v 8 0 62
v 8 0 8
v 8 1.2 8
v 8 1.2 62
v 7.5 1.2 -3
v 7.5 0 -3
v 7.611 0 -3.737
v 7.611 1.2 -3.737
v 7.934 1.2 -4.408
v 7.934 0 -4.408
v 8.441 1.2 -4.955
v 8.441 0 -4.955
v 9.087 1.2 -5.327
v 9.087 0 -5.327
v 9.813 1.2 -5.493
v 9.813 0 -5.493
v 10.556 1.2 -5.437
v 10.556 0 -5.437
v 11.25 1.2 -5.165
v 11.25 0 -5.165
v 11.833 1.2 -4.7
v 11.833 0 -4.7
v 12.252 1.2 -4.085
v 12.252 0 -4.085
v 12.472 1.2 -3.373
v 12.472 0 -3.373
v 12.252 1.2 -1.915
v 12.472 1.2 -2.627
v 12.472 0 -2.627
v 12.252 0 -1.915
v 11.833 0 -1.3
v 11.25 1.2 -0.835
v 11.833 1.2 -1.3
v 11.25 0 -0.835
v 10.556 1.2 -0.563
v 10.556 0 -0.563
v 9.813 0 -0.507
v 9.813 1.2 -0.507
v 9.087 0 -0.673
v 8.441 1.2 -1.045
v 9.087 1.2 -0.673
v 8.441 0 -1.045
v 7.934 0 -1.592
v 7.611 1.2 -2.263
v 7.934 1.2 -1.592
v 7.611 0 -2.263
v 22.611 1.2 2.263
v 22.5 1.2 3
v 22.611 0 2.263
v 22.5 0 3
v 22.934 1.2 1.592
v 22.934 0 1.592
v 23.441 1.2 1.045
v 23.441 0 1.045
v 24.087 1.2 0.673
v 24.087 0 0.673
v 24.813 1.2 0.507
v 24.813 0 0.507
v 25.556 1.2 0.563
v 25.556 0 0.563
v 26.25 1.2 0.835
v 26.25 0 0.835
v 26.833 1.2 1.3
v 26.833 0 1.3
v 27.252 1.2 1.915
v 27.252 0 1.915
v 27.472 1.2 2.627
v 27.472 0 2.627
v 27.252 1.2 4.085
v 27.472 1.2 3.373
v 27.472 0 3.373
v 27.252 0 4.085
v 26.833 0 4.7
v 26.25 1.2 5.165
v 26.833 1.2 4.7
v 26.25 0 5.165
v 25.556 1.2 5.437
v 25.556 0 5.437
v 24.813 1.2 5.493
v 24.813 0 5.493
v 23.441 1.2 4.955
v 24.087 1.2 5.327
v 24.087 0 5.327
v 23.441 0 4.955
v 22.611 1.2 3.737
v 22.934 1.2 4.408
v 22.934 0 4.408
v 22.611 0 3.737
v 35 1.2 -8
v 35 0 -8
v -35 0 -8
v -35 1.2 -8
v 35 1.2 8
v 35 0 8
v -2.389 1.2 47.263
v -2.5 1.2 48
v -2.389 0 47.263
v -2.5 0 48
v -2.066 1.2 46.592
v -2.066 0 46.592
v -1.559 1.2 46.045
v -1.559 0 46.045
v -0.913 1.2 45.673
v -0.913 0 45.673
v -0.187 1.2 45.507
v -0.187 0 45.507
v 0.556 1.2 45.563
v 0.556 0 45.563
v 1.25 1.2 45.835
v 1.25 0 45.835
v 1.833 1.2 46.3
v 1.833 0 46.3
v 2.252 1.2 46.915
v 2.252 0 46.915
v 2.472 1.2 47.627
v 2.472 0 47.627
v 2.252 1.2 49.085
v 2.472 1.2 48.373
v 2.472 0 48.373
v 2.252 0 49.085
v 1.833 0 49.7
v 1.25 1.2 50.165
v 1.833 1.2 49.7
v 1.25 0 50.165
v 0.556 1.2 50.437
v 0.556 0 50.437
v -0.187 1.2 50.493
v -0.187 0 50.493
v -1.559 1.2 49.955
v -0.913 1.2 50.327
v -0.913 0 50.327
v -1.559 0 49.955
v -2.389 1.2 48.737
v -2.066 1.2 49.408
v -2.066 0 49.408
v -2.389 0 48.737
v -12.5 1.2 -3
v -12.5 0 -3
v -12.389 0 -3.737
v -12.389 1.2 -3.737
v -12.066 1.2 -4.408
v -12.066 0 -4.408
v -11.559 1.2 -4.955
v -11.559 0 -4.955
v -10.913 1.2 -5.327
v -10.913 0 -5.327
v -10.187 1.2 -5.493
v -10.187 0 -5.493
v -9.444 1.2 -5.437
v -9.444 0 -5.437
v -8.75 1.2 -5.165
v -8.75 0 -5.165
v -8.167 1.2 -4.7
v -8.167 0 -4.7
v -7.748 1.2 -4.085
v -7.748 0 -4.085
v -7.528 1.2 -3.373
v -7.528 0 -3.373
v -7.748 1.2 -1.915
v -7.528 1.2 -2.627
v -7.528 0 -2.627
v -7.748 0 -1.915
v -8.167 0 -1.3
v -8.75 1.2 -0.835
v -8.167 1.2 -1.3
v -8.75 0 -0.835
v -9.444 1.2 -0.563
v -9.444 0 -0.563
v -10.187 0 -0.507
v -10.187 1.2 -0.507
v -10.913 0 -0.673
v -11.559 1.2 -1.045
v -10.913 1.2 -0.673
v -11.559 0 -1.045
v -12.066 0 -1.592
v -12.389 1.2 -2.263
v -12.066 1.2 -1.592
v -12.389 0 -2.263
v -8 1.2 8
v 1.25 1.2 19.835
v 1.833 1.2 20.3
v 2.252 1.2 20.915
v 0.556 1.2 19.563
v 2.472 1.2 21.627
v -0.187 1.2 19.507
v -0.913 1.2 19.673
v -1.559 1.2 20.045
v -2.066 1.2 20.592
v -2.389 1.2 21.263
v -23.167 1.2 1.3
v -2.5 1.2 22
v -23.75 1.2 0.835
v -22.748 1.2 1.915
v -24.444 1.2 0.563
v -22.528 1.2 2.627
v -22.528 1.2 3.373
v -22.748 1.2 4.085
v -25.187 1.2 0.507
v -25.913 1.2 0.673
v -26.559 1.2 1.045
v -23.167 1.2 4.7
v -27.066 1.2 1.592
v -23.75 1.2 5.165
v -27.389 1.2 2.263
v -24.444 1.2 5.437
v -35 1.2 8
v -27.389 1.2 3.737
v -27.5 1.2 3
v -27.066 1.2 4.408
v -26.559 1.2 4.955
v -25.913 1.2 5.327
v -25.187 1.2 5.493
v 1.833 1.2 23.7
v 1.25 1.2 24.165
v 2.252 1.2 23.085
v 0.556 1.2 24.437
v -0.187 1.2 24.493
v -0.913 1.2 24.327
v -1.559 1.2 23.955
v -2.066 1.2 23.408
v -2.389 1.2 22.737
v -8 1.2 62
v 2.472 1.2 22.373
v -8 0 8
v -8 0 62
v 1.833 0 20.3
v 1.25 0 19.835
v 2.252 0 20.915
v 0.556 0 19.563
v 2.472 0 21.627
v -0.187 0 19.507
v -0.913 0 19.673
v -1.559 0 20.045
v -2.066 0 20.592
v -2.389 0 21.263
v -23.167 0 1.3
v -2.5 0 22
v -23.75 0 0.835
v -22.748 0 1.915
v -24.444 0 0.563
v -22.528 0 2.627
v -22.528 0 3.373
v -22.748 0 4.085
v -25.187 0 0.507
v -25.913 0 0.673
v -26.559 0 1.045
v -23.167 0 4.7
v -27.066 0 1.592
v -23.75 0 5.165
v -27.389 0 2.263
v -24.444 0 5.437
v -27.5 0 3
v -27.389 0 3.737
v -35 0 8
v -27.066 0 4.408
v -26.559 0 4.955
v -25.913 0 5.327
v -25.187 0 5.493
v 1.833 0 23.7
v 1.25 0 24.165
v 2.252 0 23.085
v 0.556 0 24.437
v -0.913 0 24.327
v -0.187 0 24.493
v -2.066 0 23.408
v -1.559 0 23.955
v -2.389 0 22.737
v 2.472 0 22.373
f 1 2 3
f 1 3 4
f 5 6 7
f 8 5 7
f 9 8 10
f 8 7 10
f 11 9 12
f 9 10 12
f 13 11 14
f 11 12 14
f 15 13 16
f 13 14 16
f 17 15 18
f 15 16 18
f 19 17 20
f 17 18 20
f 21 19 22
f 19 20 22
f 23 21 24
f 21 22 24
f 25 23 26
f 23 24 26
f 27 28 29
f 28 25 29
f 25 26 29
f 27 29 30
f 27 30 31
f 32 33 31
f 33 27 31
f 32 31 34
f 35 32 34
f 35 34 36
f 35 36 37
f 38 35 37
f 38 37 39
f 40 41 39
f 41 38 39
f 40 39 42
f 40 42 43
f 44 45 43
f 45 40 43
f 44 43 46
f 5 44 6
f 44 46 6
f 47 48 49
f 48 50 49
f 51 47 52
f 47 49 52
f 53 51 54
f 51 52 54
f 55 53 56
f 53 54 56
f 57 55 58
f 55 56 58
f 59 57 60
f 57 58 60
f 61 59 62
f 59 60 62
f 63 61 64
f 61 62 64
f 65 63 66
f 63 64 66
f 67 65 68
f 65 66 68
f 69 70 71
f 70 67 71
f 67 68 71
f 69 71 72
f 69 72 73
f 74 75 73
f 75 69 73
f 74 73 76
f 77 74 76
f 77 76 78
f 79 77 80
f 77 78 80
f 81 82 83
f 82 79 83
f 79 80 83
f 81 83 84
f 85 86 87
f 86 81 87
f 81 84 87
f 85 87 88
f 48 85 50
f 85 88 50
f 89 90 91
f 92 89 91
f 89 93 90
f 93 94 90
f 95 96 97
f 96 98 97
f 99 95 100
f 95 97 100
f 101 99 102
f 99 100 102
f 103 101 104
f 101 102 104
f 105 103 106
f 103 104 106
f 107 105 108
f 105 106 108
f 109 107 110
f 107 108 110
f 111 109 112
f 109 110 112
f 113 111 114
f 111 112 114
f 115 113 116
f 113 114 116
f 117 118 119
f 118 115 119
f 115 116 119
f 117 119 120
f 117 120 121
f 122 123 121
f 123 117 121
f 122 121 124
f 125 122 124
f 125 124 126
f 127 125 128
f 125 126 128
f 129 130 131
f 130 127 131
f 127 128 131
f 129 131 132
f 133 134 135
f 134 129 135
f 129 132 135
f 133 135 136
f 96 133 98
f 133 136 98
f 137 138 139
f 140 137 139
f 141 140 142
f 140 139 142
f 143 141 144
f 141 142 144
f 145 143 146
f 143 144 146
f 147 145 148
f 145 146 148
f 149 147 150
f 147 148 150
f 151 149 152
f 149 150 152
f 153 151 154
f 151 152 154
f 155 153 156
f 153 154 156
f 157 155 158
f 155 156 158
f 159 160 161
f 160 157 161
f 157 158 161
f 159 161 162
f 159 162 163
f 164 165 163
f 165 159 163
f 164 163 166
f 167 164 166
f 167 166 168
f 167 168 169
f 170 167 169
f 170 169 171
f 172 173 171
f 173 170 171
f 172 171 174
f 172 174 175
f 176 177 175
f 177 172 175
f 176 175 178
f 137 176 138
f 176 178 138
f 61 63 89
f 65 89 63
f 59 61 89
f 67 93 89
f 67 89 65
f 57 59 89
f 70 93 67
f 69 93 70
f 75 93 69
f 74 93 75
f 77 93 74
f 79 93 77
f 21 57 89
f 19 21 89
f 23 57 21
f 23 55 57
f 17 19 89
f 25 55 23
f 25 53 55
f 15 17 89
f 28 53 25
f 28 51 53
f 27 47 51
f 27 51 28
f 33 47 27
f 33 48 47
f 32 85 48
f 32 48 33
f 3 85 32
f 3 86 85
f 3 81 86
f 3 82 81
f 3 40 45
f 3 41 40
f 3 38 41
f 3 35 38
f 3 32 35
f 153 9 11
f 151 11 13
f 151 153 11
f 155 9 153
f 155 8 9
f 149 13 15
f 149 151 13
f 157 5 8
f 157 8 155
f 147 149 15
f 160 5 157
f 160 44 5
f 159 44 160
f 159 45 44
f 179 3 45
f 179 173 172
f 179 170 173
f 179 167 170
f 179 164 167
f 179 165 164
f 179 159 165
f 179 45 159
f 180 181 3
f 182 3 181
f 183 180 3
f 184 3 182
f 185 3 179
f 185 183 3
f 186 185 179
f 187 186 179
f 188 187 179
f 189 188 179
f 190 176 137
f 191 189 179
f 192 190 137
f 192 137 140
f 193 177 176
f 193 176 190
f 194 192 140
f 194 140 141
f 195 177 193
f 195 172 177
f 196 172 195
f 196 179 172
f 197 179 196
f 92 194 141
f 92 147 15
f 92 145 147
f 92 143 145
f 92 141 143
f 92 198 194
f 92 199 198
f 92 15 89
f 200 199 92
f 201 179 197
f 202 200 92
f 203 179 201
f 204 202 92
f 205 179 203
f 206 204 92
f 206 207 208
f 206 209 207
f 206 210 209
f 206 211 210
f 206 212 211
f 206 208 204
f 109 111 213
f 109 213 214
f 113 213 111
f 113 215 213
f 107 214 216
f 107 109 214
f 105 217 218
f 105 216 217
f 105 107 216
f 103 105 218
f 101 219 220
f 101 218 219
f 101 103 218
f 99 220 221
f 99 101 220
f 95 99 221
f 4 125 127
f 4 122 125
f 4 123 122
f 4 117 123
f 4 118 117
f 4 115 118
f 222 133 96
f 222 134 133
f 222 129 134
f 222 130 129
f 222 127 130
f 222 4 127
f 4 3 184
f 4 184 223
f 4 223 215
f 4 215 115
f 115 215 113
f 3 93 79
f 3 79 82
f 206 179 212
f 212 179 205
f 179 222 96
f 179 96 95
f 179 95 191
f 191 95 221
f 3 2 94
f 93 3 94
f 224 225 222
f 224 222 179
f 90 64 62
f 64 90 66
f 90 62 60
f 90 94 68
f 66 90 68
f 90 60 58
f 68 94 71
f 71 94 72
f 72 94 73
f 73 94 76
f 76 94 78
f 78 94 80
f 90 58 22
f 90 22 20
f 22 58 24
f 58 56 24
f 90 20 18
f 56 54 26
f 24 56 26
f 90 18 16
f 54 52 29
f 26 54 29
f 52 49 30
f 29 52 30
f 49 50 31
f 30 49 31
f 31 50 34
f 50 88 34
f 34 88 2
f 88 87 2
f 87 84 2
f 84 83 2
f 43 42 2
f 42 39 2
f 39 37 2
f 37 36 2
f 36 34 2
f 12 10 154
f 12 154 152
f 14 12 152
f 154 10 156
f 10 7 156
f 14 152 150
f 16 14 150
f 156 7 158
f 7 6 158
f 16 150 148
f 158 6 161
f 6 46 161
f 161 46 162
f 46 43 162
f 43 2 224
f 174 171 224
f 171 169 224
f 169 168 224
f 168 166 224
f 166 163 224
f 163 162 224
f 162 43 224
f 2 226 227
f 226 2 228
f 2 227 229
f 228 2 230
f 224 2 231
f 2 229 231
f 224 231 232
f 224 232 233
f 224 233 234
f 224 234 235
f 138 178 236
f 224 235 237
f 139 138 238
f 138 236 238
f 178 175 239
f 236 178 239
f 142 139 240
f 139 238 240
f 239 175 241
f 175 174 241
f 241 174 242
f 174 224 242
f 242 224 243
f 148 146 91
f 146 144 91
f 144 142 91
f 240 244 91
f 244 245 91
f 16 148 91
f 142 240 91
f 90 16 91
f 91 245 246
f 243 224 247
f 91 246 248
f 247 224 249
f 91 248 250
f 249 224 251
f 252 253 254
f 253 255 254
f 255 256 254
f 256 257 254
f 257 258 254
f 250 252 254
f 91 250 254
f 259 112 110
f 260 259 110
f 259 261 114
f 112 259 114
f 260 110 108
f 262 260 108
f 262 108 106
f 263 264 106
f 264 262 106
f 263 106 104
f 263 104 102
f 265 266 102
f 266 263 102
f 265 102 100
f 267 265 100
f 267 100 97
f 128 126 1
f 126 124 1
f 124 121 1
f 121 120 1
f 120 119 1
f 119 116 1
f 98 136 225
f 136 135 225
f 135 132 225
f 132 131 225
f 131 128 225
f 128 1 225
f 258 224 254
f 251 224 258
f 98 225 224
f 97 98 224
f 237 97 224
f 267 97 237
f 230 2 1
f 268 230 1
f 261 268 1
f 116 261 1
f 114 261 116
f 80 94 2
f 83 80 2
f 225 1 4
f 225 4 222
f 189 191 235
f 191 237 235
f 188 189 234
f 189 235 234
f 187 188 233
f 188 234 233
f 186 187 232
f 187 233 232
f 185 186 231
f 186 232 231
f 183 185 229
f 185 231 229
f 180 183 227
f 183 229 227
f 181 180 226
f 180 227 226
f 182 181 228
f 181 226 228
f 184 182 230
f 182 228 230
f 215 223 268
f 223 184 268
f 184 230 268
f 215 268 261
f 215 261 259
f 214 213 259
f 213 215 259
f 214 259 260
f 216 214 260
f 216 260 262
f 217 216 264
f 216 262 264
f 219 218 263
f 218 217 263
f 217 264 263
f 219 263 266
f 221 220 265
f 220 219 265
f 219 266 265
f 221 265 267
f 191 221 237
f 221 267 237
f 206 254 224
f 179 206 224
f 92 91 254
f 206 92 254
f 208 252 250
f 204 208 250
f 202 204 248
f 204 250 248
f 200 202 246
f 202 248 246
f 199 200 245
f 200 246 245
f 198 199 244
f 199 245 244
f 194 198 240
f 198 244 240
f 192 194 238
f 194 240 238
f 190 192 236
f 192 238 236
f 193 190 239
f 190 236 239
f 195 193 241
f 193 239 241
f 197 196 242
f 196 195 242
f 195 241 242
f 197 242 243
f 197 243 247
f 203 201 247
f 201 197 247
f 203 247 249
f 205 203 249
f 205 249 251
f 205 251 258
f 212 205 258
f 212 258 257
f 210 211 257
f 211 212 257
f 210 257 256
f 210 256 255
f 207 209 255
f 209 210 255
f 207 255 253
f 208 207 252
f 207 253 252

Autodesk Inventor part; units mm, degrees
ref_plane "YZ Plane" through (0, 0, 0) normal (1, 0, 0) x (0, 1, 0)
ref_plane "XZ Plane" through (0, 0, 0) normal (0, 1, 0) x (-1, 0, 0)
ref_plane "XY Plane" through (0, 0, 0) normal (0, 0, 1) x (1, 0, 0)
sketch "Sketch1" plane through (0, 0, 0) normal (0, 1, 0) x (-1, 0, 0)
  line L0 (-35, 8) -> (-35, -8)
  line L1 (-35, -8) -> (35, -8)
  line L2 (35, -8) -> (35, 8)
  line L3 (35, 8) -> (-35, -8) construction
  line L4 (-35, 8) -> (35, -8) construction
  line L5 (-8, 8) -> (-8, 62)
  line L6 (-8, 62) -> (8, 62)
  line L7 (8, 62) -> (8, 8)
  line L8 (0, 0) -> (0, 99.8973) construction
  line L9 (35, 8) -> (8, 8)
  line L10 (-8, 8) -> (-35, 8)
  circle A0 centre (25, 3) radius 2.5
  circle A1 centre (10, -3) radius 2.5
  circle A2 centre (-10, -3) radius 2.5
  circle A3 centre (-25, 3) radius 2.5
  circle A4 centre (0, 22) radius 2.5
  circle A5 centre (0, 48) radius 2.5
  dimension "d0" = 70
  dimension "d1" = 16
  dimension "d2" = 16
  dimension "d4" = 70
  dimension "d5" = 5
  dimension "d6" = 5
  dimension "d7" = 5
  dimension "d8" = 10
  dimension "d10" = 10
  dimension "d11" = 10
  dimension "d12" = 10
  dimension "d13" = 14
  dimension "d14" = 40
extrude "Extrusion1" add sketch "Sketch1" along normal blind 1.2
equation "\"d10\" = d8"
equation "\"d11\" = d8"
equation "\"d12\" = d8"
equation "\"d13\" = 0.2 * d4"
equation "\"d14\" = 0.571429 * d4"
properties part number "FlatTee"
